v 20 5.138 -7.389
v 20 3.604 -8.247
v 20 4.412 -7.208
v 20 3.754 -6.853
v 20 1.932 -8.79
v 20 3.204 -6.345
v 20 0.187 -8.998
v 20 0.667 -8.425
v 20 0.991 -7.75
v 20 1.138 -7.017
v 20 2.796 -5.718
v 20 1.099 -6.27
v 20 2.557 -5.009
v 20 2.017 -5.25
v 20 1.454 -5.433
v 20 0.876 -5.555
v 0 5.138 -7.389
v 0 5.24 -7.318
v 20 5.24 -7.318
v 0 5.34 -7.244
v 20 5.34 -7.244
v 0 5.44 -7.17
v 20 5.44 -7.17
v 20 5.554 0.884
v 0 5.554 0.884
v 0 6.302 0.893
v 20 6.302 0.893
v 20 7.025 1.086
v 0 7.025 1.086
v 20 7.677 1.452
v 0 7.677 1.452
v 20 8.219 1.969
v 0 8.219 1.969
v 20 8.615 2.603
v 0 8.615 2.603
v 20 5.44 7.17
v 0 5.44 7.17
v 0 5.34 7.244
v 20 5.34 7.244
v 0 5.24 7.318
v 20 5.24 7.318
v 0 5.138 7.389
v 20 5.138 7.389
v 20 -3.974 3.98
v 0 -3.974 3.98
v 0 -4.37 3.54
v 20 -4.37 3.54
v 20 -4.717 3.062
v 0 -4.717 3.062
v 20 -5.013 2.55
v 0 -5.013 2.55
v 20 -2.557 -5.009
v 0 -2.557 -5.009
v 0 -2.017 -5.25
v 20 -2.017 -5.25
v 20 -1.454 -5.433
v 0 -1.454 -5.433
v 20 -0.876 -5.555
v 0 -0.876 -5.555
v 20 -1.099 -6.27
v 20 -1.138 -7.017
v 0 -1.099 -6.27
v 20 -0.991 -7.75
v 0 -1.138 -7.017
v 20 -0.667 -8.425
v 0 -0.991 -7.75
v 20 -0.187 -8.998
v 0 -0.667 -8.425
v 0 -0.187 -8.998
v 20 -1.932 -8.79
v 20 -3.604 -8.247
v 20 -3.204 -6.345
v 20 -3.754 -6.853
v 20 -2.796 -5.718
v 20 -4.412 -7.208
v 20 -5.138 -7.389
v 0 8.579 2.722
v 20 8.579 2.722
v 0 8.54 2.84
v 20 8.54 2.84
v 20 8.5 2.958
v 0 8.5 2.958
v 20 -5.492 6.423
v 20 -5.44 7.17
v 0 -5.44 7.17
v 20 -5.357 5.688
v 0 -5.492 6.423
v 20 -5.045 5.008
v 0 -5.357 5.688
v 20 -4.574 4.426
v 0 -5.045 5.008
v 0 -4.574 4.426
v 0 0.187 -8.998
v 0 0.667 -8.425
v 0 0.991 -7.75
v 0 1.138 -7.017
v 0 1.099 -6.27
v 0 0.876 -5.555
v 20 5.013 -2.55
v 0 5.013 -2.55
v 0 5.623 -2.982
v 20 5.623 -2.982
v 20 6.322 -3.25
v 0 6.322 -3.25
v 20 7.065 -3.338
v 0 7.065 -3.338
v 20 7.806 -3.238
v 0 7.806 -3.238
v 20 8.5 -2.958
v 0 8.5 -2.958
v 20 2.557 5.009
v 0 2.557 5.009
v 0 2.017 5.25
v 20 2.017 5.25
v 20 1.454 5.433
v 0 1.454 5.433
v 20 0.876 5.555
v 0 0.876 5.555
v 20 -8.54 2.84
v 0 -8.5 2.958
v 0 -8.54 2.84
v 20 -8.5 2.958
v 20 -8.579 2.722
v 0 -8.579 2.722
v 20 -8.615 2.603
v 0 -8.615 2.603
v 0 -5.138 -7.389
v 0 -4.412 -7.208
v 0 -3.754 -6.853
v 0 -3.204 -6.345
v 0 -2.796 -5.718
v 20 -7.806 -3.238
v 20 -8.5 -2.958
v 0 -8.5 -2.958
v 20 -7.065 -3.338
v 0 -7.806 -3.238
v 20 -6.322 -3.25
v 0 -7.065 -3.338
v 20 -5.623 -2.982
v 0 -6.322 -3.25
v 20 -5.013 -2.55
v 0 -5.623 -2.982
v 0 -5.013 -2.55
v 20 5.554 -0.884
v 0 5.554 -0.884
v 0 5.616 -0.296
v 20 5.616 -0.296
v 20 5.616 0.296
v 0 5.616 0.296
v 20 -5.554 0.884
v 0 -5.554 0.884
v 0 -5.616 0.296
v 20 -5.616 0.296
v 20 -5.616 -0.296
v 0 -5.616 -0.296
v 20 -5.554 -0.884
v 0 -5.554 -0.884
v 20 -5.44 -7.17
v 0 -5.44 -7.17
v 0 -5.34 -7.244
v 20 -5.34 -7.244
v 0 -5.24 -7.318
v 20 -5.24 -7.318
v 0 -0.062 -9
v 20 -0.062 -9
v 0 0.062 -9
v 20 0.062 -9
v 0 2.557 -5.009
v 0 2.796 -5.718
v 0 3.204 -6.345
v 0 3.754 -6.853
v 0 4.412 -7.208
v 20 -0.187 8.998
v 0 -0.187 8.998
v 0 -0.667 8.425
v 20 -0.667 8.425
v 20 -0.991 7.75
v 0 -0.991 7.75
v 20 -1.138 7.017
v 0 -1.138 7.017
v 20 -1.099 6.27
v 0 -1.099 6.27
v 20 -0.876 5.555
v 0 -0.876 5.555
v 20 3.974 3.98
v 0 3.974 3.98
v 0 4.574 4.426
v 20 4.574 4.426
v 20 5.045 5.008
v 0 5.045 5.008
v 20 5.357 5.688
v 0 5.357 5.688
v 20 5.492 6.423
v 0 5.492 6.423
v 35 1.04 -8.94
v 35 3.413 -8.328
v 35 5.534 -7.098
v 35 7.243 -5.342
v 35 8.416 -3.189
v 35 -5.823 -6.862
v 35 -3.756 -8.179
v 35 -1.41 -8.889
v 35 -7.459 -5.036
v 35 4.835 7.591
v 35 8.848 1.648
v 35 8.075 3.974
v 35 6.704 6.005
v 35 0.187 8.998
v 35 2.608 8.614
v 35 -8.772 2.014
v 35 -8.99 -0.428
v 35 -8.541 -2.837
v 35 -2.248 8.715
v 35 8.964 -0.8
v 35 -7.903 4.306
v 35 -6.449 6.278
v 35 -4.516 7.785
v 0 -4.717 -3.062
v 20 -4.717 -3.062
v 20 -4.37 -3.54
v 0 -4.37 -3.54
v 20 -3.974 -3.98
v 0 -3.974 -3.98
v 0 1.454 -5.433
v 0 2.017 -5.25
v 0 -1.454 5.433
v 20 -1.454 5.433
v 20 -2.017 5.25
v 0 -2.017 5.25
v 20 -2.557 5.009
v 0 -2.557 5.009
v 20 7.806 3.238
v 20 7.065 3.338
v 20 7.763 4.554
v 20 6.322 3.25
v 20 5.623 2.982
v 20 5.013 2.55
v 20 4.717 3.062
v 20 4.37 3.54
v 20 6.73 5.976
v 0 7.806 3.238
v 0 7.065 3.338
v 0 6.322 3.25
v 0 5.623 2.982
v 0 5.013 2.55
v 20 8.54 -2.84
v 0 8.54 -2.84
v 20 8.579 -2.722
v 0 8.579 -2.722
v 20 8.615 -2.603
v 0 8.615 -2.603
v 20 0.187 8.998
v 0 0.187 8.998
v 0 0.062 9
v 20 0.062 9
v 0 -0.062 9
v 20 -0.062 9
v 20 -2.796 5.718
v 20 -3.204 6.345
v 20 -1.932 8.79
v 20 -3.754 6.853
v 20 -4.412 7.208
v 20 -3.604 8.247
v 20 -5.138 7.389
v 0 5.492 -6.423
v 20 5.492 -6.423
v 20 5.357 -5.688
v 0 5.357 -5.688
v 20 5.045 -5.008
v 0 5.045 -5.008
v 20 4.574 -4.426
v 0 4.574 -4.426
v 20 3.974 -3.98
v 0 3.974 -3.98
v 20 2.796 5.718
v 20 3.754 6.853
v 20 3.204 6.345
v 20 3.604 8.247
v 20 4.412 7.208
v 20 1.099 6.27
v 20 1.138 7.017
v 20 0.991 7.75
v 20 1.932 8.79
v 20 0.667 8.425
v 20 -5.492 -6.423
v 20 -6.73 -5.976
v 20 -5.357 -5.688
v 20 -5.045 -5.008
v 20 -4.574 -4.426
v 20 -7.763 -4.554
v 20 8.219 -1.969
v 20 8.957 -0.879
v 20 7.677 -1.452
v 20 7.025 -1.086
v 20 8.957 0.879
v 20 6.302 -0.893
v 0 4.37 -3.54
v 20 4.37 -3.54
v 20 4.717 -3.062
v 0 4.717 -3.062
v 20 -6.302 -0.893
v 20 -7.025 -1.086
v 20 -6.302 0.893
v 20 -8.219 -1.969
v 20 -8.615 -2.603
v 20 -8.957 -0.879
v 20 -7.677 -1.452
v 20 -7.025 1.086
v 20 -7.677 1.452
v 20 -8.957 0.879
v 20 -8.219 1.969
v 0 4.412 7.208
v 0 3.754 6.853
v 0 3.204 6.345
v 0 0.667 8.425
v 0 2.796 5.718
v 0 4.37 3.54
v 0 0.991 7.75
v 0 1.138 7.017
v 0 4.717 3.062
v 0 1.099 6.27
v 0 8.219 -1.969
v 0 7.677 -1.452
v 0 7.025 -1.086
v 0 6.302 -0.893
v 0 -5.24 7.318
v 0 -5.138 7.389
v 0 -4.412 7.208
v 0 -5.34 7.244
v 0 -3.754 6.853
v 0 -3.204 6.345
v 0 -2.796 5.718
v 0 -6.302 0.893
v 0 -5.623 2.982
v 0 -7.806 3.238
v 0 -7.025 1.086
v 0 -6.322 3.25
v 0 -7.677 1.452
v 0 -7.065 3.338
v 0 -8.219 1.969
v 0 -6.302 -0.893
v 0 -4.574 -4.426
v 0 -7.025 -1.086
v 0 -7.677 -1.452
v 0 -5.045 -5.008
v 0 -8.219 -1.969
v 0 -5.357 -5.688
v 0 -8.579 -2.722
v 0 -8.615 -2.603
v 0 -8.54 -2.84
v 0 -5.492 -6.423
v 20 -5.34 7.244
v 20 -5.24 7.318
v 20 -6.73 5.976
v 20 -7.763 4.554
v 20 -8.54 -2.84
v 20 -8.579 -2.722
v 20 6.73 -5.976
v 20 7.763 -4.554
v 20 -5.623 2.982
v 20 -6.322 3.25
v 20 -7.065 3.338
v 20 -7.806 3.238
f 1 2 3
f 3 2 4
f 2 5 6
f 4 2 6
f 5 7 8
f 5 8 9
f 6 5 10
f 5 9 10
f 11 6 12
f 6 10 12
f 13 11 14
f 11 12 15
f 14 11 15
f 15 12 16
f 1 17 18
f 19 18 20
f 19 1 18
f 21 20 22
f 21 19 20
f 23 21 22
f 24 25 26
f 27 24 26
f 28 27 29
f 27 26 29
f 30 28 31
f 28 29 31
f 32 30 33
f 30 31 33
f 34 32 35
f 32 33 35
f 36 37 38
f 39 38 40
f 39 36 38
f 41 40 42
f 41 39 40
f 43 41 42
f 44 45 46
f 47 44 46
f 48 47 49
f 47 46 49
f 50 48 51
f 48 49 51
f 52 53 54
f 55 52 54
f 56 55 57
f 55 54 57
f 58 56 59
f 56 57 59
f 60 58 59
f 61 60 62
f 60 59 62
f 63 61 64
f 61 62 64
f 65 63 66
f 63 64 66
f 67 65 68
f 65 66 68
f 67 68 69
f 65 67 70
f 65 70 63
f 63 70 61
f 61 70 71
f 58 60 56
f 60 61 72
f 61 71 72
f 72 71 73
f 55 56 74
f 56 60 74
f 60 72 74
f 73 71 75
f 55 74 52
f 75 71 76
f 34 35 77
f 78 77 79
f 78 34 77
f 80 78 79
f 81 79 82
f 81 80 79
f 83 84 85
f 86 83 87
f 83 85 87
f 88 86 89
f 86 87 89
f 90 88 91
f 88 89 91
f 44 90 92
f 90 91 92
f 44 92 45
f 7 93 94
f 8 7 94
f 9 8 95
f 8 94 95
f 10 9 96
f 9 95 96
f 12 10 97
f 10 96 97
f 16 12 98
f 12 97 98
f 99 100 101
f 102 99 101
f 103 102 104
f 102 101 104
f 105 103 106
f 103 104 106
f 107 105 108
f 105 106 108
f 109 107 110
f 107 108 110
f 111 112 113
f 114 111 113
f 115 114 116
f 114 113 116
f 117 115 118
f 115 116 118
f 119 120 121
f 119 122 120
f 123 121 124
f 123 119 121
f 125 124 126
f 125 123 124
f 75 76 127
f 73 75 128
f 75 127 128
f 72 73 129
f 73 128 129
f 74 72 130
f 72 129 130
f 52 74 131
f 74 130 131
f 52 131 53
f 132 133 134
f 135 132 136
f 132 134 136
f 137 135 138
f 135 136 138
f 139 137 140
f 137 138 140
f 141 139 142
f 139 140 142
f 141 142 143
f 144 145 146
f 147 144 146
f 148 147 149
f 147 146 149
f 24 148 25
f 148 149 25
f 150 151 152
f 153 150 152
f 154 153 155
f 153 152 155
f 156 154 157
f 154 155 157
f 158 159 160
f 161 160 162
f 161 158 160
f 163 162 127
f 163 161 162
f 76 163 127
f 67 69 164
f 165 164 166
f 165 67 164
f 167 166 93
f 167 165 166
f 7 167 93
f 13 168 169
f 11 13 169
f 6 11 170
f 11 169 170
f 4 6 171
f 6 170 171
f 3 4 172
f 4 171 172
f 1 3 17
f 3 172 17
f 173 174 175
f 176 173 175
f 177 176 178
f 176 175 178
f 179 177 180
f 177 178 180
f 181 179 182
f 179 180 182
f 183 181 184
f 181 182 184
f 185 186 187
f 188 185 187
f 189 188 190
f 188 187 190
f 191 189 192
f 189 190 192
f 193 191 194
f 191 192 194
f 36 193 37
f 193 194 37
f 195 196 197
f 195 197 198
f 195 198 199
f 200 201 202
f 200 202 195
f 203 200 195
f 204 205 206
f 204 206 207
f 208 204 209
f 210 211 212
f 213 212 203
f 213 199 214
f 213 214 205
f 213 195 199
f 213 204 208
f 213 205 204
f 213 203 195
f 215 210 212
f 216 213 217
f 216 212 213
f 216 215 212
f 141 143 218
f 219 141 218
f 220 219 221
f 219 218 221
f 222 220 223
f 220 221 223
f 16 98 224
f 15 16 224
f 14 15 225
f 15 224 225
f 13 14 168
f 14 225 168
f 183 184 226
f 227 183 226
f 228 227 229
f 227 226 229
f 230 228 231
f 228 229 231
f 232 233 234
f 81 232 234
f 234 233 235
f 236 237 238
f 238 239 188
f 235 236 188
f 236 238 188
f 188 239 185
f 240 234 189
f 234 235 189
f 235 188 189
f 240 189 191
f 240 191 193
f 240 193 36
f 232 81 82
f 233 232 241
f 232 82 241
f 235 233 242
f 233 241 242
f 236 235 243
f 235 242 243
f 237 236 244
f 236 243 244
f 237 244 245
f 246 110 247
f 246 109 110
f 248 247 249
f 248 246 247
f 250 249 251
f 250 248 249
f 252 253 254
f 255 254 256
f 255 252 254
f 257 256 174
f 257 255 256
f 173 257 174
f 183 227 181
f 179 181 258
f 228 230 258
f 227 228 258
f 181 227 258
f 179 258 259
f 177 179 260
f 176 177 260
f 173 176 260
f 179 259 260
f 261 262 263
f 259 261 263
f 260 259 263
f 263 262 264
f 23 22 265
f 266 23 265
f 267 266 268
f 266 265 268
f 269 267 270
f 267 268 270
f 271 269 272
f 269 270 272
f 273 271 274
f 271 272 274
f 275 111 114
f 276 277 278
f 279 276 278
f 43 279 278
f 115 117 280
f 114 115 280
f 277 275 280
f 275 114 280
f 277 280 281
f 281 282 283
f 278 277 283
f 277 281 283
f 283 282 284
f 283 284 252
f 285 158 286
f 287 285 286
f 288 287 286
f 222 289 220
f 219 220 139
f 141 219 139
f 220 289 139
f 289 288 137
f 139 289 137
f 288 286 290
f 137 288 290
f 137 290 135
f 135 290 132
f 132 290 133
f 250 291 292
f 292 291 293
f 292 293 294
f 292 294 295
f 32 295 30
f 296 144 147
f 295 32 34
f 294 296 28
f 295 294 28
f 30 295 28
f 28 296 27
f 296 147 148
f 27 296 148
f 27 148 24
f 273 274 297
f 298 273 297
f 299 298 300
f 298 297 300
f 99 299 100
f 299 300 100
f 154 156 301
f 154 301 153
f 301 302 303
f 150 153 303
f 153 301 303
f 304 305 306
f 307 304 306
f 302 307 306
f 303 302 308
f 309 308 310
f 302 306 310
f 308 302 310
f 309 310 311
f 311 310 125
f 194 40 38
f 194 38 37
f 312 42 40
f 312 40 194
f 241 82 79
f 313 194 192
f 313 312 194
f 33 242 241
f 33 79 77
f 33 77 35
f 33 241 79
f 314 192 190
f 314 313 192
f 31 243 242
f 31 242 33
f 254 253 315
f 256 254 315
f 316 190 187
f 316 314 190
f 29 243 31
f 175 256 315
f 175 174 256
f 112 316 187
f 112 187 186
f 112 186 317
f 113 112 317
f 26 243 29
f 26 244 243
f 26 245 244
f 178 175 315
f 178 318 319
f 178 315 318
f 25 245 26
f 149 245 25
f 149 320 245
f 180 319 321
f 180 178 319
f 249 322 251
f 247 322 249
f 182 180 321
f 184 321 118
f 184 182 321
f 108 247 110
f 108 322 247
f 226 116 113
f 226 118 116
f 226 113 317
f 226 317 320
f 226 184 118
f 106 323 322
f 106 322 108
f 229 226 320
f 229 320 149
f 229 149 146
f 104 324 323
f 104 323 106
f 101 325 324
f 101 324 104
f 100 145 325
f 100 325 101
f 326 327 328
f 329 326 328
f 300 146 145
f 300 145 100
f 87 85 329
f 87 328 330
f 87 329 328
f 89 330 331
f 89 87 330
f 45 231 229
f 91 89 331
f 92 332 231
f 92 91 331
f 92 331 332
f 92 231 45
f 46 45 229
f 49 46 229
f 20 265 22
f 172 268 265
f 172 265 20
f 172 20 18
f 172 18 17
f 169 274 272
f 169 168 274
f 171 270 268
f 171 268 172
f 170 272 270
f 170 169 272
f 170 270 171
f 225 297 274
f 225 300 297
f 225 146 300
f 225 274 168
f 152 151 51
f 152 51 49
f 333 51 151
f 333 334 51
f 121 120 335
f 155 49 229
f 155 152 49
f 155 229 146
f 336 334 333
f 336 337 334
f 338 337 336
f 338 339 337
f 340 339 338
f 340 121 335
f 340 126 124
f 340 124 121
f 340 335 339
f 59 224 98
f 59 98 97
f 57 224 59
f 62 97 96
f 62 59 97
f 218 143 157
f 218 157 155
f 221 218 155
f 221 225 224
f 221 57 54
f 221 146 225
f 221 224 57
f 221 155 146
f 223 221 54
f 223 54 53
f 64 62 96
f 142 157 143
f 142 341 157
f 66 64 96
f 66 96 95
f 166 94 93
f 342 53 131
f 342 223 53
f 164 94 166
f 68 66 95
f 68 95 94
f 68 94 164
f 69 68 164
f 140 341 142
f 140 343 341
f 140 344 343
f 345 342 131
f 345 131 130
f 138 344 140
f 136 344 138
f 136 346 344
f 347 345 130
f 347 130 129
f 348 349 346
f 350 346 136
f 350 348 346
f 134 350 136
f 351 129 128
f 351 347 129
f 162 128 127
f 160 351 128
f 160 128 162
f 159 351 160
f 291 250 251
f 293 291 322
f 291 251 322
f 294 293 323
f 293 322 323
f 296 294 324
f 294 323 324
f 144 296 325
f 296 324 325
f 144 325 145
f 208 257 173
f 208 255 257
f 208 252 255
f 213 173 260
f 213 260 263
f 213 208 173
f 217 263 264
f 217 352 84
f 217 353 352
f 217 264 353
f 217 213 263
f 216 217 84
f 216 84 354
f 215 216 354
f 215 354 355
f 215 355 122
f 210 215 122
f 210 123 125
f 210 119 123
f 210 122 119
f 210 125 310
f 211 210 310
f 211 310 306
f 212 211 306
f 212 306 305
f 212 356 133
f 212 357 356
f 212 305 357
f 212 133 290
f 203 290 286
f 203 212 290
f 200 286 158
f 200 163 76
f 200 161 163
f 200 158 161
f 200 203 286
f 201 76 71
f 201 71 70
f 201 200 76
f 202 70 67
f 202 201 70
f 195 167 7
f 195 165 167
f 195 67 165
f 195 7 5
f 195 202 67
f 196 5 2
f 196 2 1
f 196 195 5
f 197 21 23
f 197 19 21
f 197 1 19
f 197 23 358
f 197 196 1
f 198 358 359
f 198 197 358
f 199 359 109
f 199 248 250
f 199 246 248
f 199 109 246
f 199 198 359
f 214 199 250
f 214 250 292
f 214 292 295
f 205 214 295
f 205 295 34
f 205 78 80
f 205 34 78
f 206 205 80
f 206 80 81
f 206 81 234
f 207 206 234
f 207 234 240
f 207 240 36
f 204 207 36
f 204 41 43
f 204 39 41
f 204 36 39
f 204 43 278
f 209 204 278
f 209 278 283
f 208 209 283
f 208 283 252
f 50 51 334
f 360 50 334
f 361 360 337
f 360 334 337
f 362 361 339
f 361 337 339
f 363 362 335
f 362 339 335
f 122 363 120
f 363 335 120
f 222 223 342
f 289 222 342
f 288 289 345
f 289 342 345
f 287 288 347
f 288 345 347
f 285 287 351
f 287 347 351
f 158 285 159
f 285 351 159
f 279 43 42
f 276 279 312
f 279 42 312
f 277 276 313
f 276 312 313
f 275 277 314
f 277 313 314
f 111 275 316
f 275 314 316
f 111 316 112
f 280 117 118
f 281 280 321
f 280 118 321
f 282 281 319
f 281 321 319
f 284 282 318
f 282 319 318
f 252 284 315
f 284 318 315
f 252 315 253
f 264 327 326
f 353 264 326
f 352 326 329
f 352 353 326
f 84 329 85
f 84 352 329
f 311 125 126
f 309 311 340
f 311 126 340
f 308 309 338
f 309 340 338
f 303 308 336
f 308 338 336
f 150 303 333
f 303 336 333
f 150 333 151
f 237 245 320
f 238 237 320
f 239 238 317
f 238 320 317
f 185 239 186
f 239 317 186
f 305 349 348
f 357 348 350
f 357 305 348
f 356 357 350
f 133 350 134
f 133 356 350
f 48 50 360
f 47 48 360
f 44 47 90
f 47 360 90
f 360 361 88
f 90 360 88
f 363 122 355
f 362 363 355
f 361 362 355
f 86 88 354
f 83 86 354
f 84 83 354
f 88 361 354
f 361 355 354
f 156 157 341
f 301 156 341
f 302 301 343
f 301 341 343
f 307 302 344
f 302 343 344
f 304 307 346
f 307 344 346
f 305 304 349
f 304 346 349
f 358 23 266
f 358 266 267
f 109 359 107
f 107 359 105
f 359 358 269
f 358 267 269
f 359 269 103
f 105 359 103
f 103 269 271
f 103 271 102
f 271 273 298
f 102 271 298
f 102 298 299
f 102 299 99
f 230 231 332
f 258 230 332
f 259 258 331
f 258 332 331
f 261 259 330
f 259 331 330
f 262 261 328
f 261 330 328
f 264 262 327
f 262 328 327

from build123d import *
from build123d.topology import SkipClean

# Parameters (mm, degrees)
BASPROSKE_W                 = 20
BASPROSKE_H                 = 9
TOOTHCUT_DEPTH              = 24.706539182
TEETHCUTS_COUNT             = 10
TEETHCUTS_ANGLE             = 324
BORSKE_R                    = 2.5
BORE_DEPTH                  = 50.0000508
IZIM1_R                     = 3
Y_KSEKLIK_EKSTR_ZYON3_DEPTH = 20
Y_KSEKLIK_EKSTR_ZYON4_START = 15
IZIM2_R                     = 9
Y_KSEKLIK_EKSTR_ZYON4_DEPTH = 15


with BuildPart() as part:
    # BasProSke → Base-Revolve (revolve)
    with BuildSketch(Plane(origin=(0, 0, 0), x_dir=(1, 0, 0), z_dir=(0, 1, 0)), mode=Mode.PRIVATE) as base_revolve_sk:
        with Locations((10, 4.5)):
            Rectangle(BASPROSKE_W, BASPROSKE_H)
    revolve(base_revolve_sk.sketch.rotate(Axis((-10, 0, 0), (1, 0, 0)), 180), axis=Axis((-10, 0, 0), (1, 0, 0)))

    # TooCutSke → ToothCut (cut, through all)
    with BuildSketch(Plane(origin=(0, 0, 0), x_dir=(0, 0, -1), z_dir=(1, 0, 0))):
        with BuildLine():
            ThreePointArc((0.883878355, 5.554109745), (0, 5.624), (-0.883878355, 5.554109745))
            ThreePointArc((-0.883878355, 5.554109745), (-1.258245767, 7.379188248), (-2.637816971, 8.631324741))
            ThreePointArc((-2.637816971, 8.631324741), (0, 9.0254), (2.637816971, 8.631324741))
            ThreePointArc((2.637816971, 8.631324741), (1.258245767, 7.379188248), (0.883878355, 5.554109745))
        make_face()
    toothcut = extrude(amount=TOOTHCUT_DEPTH, mode=Mode.SUBTRACT)

    # TeethCuts: ToothCut ×10 about axis
    teethcuts_axis = Axis((-10, 0, 0), (1, 0, 0))
    for i in range(1, TEETHCUTS_COUNT):
        add(toothcut.rotate(teethcuts_axis, i * TEETHCUTS_ANGLE / (TEETHCUTS_COUNT - 1)), mode=Mode.SUBTRACT)

    # BorSke → Bore (cut, symmetric)
    with BuildSketch(Plane(origin=(0, 0, 0), x_dir=(0, 0, -1), z_dir=(1, 0, 0))):
        with Locations(Location((0, 0, 0), (0, 0, 180))):
            Circle(BORSKE_R)
    extrude(amount=BORE_DEPTH, both=True, mode=Mode.SUBTRACT)

    # Çizim1 → Yükseklik-Ekstrüzyon3 (add)
    with BuildSketch(Plane(origin=(20, 0, 0), x_dir=(0, 0, -1), z_dir=(1, 0, 0))):
        Circle(IZIM1_R)
    extrude(amount=-Y_KSEKLIK_EKSTR_ZYON3_DEPTH)

    # Çizim2 → Yükseklik-Ekstrüzyon4 (add)
    with SkipClean():  # the faces are left unmerged after this step: merging them gives an invalid solid
        with BuildSketch(Plane(origin=(20, 0, 0), x_dir=(0, 0, -1), z_dir=(1, 0, 0)).offset(Y_KSEKLIK_EKSTR_ZYON4_START)):
            with Locations(Location((0, 0, 0), (0, 0, 178.810548778))):
                Circle(IZIM2_R)
        extrude(amount=-Y_KSEKLIK_EKSTR_ZYON4_DEPTH)


solid = part.part
